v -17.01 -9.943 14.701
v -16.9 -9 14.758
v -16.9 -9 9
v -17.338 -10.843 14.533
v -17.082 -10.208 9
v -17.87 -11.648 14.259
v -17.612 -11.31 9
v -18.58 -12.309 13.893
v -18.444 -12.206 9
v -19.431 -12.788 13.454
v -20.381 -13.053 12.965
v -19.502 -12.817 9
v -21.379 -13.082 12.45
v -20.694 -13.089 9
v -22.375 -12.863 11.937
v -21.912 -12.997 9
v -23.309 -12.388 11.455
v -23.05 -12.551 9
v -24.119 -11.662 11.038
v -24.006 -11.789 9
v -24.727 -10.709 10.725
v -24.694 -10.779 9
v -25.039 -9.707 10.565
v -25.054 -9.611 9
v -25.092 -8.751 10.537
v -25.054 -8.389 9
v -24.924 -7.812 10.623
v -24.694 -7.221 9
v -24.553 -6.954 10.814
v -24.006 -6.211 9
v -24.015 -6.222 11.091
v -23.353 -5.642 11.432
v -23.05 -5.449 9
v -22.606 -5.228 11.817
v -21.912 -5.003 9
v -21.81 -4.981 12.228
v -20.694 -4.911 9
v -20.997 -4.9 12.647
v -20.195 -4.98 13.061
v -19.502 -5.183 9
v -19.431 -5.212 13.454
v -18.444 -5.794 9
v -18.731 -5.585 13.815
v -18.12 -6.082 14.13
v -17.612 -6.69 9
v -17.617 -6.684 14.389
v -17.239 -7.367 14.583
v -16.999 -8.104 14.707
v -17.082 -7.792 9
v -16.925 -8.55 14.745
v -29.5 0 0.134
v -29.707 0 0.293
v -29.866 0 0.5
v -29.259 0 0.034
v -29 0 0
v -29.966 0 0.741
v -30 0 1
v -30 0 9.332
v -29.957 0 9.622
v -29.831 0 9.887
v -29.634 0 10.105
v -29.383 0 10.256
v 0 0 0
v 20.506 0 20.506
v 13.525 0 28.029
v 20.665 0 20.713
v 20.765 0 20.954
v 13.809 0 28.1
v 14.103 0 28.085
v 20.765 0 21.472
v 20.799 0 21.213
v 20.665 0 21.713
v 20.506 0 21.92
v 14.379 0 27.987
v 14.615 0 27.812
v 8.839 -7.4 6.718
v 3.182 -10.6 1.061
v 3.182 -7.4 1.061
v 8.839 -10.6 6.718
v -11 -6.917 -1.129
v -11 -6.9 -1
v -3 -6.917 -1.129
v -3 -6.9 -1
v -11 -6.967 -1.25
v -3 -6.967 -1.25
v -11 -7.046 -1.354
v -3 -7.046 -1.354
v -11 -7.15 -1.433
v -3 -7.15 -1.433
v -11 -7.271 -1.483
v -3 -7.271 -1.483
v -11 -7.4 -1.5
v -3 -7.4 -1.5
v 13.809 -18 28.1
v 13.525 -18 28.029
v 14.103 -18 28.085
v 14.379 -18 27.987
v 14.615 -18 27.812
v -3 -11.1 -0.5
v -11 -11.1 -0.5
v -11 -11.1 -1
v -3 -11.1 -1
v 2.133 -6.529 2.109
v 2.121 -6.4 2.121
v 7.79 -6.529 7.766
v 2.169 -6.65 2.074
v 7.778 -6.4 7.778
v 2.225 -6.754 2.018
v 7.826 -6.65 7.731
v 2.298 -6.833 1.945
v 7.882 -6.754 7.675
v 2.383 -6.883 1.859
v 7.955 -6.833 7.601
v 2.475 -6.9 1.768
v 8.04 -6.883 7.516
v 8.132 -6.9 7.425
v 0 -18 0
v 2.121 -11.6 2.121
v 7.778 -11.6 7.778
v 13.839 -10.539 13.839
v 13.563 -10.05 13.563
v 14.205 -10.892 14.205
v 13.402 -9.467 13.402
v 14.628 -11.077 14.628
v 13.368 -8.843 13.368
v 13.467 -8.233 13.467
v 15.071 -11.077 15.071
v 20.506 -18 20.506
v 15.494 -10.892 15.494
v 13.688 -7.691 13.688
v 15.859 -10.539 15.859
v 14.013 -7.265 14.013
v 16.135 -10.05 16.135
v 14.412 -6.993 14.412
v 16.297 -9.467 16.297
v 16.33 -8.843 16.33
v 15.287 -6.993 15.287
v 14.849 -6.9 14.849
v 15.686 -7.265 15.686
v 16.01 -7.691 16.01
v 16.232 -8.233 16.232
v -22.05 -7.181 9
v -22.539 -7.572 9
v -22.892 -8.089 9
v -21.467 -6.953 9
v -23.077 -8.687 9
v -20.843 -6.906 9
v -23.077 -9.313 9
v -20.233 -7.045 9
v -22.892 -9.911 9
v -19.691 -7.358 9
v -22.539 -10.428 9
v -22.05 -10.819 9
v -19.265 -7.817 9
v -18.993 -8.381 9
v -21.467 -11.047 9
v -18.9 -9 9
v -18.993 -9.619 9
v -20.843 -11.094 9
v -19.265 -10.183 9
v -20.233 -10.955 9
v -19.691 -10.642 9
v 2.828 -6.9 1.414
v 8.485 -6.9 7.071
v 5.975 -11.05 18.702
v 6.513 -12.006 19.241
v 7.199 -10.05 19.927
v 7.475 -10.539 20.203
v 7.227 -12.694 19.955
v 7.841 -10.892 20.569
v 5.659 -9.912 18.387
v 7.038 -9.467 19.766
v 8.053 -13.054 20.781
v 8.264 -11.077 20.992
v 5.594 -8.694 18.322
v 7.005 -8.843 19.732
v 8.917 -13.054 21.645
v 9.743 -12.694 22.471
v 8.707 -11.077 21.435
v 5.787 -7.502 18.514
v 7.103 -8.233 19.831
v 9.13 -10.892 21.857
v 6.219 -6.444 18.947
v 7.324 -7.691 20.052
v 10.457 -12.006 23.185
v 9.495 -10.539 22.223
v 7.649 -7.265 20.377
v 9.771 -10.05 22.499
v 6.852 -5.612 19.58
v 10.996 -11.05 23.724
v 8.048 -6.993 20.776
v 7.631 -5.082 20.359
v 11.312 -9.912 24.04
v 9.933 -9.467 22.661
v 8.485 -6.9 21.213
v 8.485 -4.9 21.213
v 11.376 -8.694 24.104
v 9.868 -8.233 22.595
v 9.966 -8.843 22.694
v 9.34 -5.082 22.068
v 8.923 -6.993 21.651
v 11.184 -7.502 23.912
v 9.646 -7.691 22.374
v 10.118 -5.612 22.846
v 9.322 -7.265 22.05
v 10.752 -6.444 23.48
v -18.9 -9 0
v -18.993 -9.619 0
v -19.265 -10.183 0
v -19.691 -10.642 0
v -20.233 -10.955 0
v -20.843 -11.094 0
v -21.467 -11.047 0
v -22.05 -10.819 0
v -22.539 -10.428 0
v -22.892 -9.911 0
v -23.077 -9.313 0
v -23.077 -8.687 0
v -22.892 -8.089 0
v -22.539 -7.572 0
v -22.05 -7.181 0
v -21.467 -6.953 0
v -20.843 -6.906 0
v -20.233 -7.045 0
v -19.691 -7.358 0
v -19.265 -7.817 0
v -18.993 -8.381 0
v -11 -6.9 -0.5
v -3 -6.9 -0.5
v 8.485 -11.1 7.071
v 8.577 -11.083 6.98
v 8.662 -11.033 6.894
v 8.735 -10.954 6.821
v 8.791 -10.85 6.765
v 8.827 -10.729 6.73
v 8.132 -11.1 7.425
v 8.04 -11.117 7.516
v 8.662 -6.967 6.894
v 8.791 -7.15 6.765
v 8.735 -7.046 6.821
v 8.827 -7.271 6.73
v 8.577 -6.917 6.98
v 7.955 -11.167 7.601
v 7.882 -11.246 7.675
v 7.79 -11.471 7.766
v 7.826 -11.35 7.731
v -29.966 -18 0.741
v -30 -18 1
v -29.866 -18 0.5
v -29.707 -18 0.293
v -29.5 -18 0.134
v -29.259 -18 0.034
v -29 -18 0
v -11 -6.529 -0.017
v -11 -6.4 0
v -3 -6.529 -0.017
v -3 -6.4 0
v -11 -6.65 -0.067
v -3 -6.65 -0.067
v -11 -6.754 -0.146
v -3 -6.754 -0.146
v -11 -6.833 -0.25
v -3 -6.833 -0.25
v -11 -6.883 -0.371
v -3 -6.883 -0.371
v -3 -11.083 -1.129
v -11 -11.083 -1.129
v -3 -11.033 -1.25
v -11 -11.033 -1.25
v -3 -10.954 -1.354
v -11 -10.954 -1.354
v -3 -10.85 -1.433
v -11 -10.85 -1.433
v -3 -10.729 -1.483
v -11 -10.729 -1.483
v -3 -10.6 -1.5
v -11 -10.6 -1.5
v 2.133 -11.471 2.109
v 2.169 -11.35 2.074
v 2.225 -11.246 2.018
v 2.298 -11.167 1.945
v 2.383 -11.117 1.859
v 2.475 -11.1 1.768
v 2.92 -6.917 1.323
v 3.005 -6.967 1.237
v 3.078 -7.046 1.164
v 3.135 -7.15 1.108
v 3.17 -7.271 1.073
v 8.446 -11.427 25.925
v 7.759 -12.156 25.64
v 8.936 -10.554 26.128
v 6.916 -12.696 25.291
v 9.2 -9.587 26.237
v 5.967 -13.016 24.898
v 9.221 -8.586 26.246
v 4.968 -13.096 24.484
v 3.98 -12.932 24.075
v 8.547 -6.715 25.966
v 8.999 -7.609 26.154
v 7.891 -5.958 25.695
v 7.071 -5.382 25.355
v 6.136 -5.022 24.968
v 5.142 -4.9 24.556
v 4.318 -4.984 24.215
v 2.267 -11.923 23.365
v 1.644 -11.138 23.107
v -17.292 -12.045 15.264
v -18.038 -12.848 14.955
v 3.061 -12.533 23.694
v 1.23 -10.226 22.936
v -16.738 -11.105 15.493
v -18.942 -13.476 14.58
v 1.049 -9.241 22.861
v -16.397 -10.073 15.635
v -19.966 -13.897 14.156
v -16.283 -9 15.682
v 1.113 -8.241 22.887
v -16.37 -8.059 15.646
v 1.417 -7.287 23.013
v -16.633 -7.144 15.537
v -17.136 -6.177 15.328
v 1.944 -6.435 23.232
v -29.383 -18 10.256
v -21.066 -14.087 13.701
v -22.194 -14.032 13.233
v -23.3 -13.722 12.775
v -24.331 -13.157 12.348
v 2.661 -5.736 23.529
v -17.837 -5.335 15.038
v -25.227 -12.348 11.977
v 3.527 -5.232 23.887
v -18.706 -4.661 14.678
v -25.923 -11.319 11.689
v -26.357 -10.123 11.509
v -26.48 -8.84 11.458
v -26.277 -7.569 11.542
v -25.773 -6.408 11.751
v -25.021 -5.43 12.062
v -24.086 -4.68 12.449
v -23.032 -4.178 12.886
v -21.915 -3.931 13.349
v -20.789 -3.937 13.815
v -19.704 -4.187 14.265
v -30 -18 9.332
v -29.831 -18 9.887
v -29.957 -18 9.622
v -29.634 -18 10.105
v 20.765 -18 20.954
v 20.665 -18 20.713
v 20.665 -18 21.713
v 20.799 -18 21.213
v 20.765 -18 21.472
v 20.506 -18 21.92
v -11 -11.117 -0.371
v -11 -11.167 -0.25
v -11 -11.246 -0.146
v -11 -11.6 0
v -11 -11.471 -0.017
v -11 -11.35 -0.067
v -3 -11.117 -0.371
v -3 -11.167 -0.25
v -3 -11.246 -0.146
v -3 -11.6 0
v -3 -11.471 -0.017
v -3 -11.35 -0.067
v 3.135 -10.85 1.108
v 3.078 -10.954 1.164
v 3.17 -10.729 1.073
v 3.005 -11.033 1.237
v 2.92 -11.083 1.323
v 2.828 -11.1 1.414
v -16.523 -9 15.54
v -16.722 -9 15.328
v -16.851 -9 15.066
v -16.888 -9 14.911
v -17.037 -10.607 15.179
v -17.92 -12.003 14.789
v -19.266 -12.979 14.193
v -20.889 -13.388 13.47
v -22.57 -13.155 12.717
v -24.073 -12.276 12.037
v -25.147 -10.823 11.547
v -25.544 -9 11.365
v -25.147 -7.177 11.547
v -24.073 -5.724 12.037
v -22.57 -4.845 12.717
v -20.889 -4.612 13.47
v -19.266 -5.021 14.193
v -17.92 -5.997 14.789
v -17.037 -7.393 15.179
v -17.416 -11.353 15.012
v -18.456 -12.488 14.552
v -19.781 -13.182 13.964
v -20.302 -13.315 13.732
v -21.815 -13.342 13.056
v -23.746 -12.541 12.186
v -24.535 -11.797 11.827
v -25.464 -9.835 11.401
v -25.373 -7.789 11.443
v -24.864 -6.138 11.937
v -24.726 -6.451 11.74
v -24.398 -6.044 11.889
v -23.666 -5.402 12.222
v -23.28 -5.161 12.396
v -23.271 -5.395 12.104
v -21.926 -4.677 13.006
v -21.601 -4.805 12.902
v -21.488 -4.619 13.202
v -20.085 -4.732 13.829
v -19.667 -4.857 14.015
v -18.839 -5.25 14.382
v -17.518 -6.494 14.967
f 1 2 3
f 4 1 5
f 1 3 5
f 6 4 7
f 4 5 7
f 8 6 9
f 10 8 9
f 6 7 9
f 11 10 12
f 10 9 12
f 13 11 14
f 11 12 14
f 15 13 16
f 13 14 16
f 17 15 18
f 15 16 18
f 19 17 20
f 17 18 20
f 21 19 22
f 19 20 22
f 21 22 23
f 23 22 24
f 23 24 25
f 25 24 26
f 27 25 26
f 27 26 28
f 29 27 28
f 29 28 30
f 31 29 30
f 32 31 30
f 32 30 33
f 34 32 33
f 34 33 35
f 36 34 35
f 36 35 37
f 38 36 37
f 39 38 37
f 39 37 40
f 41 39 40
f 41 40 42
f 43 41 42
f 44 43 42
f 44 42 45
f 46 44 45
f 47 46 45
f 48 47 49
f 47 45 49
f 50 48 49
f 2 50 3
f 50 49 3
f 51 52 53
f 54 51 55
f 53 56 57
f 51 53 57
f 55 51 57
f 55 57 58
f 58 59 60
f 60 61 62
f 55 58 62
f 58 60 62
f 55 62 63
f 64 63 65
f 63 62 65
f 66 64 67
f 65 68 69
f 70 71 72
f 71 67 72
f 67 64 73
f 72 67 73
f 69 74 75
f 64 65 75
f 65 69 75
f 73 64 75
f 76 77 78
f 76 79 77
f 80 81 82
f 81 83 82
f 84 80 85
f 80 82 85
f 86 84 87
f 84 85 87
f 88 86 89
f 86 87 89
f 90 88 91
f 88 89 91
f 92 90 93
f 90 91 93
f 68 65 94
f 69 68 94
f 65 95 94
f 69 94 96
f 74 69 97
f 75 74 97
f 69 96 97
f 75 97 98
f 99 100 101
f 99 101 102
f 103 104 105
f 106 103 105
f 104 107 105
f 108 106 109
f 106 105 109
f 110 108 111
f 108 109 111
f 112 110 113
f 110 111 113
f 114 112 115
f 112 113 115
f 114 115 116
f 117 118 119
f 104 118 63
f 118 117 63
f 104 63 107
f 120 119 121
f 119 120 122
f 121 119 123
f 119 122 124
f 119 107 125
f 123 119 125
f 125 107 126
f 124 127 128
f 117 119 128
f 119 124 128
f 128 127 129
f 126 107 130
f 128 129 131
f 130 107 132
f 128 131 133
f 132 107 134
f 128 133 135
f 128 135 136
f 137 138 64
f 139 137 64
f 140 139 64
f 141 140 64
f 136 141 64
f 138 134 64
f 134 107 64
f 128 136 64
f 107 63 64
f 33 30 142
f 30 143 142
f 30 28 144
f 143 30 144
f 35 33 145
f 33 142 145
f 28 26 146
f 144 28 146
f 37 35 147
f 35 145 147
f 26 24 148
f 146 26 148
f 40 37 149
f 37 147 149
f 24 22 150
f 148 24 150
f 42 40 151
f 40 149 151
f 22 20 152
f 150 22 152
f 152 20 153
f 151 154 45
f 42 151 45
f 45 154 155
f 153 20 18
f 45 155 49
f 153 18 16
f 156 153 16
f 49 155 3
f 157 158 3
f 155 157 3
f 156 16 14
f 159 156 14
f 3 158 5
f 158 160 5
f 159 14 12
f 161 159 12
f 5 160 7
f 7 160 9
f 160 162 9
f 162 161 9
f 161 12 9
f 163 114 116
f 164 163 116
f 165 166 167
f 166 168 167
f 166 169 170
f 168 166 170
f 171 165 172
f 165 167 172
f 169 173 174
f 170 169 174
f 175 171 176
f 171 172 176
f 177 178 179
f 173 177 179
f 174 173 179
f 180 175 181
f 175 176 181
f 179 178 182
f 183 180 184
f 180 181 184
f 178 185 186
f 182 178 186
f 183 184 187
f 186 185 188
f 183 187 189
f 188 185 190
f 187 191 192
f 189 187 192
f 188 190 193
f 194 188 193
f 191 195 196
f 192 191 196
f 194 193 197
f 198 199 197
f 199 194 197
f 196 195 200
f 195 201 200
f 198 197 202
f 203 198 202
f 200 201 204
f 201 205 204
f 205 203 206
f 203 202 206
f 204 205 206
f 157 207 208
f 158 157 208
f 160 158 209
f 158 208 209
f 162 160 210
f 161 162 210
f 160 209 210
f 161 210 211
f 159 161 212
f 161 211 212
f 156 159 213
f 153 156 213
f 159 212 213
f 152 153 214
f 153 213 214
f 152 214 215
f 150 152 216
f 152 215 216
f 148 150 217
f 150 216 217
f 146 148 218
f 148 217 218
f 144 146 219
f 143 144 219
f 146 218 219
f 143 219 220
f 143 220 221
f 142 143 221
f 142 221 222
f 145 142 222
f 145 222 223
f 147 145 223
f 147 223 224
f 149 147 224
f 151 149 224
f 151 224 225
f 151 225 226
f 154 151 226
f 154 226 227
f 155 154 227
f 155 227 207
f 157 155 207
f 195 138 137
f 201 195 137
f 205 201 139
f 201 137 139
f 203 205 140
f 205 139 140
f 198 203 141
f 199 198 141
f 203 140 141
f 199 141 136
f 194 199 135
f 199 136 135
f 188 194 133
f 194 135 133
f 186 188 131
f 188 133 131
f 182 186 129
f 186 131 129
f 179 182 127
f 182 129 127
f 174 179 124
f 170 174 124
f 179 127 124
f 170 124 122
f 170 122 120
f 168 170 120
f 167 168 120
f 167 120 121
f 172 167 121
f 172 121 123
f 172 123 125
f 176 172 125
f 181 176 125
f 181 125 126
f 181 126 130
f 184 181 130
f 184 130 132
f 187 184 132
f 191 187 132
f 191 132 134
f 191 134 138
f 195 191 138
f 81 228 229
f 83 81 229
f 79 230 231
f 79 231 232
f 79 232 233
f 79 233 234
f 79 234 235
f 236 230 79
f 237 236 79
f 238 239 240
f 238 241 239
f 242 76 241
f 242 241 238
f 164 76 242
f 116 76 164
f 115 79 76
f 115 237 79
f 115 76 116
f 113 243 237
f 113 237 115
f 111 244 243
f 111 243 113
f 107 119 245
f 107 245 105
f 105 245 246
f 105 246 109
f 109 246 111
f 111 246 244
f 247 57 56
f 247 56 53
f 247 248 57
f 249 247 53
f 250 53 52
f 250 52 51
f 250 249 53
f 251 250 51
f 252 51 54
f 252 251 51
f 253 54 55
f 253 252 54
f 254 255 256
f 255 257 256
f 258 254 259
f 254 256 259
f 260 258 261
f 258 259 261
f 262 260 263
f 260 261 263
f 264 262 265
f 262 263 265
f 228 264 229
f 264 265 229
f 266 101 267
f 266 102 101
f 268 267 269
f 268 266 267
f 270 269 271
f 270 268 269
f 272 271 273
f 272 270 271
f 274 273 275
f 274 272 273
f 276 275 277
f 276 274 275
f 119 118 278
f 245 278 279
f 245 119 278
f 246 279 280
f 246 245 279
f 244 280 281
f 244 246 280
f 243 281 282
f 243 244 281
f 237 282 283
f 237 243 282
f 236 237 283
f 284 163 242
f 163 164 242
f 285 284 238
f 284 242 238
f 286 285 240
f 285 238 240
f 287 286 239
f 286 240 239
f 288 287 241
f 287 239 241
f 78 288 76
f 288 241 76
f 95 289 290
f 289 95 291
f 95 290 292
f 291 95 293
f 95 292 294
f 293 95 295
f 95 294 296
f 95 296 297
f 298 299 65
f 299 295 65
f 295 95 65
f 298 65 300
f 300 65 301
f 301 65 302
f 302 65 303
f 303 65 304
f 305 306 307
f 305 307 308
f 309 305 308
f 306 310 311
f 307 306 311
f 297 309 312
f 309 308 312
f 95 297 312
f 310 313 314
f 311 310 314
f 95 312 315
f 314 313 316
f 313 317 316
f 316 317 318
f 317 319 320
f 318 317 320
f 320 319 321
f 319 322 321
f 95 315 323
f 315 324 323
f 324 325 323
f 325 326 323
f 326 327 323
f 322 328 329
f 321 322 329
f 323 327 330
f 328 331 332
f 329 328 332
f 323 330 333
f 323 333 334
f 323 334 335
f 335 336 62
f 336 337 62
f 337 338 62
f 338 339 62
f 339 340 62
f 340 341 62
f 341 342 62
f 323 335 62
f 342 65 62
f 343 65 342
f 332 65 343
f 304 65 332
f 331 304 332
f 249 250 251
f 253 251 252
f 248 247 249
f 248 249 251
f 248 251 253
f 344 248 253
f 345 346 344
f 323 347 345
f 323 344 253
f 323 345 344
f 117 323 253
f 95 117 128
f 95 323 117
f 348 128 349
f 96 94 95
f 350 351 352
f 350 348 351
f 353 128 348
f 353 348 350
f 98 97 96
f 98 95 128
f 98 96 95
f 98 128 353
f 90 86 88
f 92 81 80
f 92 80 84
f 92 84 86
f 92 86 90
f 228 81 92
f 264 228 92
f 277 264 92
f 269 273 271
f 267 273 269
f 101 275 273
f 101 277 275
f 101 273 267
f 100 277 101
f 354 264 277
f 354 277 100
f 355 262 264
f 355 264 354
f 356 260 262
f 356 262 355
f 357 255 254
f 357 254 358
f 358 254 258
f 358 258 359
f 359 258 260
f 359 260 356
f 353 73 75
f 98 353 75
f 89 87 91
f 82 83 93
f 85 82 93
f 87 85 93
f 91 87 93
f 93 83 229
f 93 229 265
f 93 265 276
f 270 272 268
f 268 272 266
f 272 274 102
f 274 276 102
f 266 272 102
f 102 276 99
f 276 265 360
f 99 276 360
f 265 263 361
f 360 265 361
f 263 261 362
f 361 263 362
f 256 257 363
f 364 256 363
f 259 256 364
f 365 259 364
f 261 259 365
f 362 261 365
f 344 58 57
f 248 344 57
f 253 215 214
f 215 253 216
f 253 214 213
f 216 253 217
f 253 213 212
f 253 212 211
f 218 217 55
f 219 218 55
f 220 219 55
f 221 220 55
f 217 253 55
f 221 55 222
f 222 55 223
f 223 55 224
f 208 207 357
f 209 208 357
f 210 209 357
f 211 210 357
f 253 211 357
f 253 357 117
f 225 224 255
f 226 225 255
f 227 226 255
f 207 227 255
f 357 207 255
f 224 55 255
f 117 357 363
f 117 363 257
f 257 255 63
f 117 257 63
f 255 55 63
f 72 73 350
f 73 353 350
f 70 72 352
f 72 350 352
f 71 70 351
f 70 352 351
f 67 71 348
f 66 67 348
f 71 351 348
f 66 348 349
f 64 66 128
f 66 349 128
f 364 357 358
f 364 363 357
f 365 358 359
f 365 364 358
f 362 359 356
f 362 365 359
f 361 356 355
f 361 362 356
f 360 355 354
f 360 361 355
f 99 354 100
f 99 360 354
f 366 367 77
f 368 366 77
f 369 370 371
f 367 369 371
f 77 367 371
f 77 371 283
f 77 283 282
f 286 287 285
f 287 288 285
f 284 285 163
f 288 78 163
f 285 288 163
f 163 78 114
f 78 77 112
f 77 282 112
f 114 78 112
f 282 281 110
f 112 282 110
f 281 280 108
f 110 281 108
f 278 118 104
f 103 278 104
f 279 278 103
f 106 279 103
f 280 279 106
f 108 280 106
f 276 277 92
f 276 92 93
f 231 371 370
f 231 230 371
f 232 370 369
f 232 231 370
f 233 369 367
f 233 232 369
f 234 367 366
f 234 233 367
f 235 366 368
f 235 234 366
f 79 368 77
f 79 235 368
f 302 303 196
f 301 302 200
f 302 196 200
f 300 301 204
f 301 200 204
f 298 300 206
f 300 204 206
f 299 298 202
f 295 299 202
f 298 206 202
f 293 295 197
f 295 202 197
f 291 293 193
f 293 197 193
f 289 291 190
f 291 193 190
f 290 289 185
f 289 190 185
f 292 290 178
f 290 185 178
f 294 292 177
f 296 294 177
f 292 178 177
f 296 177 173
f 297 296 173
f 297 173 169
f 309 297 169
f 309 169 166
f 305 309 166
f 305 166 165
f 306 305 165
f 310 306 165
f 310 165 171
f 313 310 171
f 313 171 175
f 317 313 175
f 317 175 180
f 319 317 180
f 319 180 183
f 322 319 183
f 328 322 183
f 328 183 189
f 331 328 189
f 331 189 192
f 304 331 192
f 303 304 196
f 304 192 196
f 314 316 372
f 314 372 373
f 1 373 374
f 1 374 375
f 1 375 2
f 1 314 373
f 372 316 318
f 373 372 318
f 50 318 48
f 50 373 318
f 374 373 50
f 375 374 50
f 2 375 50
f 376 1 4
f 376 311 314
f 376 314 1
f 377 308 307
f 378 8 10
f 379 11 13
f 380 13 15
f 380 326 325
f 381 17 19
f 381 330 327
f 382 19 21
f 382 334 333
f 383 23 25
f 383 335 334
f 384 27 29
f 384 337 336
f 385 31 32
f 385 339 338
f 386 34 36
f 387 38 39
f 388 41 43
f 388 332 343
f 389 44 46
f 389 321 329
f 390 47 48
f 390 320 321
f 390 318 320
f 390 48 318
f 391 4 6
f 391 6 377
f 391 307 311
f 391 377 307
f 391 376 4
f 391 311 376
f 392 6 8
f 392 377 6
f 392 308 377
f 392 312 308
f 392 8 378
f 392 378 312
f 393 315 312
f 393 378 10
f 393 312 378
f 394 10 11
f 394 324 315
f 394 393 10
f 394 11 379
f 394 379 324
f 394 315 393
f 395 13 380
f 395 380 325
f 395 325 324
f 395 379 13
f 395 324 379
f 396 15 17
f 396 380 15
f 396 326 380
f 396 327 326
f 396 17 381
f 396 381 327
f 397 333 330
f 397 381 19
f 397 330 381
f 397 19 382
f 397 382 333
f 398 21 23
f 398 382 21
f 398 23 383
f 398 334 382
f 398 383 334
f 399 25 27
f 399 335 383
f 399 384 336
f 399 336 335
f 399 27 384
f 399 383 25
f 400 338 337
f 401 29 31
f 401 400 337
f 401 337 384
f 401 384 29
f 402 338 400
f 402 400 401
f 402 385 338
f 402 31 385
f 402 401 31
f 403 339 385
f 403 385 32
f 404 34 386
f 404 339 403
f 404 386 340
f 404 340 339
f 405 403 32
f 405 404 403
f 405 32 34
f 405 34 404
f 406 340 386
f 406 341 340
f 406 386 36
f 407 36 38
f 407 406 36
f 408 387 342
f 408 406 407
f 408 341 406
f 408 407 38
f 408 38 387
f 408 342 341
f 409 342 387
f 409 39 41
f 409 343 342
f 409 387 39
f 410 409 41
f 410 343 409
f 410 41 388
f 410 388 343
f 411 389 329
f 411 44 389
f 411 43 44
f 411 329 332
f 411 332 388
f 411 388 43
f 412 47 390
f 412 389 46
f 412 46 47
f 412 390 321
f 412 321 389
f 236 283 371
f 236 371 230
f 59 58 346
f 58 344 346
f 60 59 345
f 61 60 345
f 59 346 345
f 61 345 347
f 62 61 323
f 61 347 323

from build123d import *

# Parameters (mm, degrees)
F1_DEPTH  = 18
F2_R      = 2.1
F3_DEPTH  = 25
F4_START  = -9
F2_R_2    = 4.1
F4_DEPTH  = 16
F6_START  = -9
F5_R      = 4.1
F5_R_2    = 2.1
F6_DEPTH  = 16
F7_DEPTH  = 25
F8_R      = 1
F2_W      = 8
F2_H      = 4.2
F9_DEPTH  = 1.5
F5_W      = 4.2
F5_H      = 8
F10_DEPTH = 1.5
F11_R     = 0.5


with BuildPart() as f1:
    # F0 (on Front) → F1 (new body)
    with BuildSketch(Plane.XZ):
        Polygon((-30, 10), (-30, 0), (0, 0), (21.2132034356, 21.2132034356), (14.1421356237, 28.2842712475), align=None)
    extrude(amount=F1_DEPTH)

    # F2 (on face) → F3 (cut)
    with BuildSketch(Plane(origin=(0, 0, 0), x_dir=(1, 0, 0), z_dir=(0, 0, -1))):
        with Locations((-21, 9)):
            Circle(F2_R)
    extrude(amount=-F3_DEPTH, mode=Mode.SUBTRACT)

    # F2 (on face) → F4 (cut)
    with BuildSketch(Plane(origin=(0, 0, 0), x_dir=(1, 0, 0), z_dir=(0, 0, -1)).offset(F4_START)):
        with Locations((-21, 9)):
            Circle(F2_R_2)
        with Locations((-21, 9)):
            Circle(F2_R, mode=Mode.SUBTRACT)
    extrude(amount=-F4_DEPTH, mode=Mode.SUBTRACT)

    # F5 (on face) → F6 (cut)
    with BuildSketch(Plane(origin=(0, 0, 0), x_dir=(0, 1, 0), z_dir=(0.7071067812, 0, -0.7071067812)).offset(F6_START)):
        with Locations((-9, 21)):
            Circle(F5_R)
        with Locations((-9, 21)):
            Circle(F5_R_2, mode=Mode.SUBTRACT)
    extrude(amount=-F6_DEPTH, mode=Mode.SUBTRACT)

    # F5 (on face) → F7 (cut)
    with BuildSketch(Plane(origin=(0, 0, 0), x_dir=(0, 1, 0), z_dir=(0.7071067812, 0, -0.7071067812))):
        with Locations((-9, 21)):
            Circle(F5_R_2)
    extrude(amount=-F7_DEPTH, mode=Mode.SUBTRACT)

    # F8
    f8_edges = [f1.edges().sort_by_distance(p)[0] for p in [
        (-30, -9, 0),
        (-30, -9, 10),
        (21.213203, -9, 21.213203),
        (14.142136, -9, 28.284271),
        (-25.1, -8.999972, 12.029646),
    ]]
    fillet(f8_edges, radius=F8_R)

    # F2 (on face) → F9 (join)
    with BuildSketch(Plane(origin=(0, 0, 0), x_dir=(1, 0, 0), z_dir=(0, 0, -1))):
        with Locations((-7, 9)):
            Rectangle(F2_W, F2_H)
    extrude(amount=F9_DEPTH)

    # F5 (on face) → F10 (join)
    with BuildSketch(Plane(origin=(0, 0, 0), x_dir=(0, 1, 0), z_dir=(0.7071067812, 0, -0.7071067812))):
        with Locations((-9, 7)):
            Rectangle(F5_W, F5_H)
    extrude(amount=F10_DEPTH)

    # F11
    f11_edges = [f1.edges().sort_by_distance(p)[0] for p in [
        (-7, -6.9, 0),
        (-7, -6.9, -1.5),
        (-7, -11.1, -1.5),
        (-7, -11.1, 0),
        (4.949747, -11.1, 4.949747),
        (6.010408, -11.1, 3.889087),
        (6.010408, -6.9, 3.889087),
        (4.949747, -6.9, 4.949747),
    ]]
    fillet(f11_edges, radius=F11_R)


solid = f1.part
